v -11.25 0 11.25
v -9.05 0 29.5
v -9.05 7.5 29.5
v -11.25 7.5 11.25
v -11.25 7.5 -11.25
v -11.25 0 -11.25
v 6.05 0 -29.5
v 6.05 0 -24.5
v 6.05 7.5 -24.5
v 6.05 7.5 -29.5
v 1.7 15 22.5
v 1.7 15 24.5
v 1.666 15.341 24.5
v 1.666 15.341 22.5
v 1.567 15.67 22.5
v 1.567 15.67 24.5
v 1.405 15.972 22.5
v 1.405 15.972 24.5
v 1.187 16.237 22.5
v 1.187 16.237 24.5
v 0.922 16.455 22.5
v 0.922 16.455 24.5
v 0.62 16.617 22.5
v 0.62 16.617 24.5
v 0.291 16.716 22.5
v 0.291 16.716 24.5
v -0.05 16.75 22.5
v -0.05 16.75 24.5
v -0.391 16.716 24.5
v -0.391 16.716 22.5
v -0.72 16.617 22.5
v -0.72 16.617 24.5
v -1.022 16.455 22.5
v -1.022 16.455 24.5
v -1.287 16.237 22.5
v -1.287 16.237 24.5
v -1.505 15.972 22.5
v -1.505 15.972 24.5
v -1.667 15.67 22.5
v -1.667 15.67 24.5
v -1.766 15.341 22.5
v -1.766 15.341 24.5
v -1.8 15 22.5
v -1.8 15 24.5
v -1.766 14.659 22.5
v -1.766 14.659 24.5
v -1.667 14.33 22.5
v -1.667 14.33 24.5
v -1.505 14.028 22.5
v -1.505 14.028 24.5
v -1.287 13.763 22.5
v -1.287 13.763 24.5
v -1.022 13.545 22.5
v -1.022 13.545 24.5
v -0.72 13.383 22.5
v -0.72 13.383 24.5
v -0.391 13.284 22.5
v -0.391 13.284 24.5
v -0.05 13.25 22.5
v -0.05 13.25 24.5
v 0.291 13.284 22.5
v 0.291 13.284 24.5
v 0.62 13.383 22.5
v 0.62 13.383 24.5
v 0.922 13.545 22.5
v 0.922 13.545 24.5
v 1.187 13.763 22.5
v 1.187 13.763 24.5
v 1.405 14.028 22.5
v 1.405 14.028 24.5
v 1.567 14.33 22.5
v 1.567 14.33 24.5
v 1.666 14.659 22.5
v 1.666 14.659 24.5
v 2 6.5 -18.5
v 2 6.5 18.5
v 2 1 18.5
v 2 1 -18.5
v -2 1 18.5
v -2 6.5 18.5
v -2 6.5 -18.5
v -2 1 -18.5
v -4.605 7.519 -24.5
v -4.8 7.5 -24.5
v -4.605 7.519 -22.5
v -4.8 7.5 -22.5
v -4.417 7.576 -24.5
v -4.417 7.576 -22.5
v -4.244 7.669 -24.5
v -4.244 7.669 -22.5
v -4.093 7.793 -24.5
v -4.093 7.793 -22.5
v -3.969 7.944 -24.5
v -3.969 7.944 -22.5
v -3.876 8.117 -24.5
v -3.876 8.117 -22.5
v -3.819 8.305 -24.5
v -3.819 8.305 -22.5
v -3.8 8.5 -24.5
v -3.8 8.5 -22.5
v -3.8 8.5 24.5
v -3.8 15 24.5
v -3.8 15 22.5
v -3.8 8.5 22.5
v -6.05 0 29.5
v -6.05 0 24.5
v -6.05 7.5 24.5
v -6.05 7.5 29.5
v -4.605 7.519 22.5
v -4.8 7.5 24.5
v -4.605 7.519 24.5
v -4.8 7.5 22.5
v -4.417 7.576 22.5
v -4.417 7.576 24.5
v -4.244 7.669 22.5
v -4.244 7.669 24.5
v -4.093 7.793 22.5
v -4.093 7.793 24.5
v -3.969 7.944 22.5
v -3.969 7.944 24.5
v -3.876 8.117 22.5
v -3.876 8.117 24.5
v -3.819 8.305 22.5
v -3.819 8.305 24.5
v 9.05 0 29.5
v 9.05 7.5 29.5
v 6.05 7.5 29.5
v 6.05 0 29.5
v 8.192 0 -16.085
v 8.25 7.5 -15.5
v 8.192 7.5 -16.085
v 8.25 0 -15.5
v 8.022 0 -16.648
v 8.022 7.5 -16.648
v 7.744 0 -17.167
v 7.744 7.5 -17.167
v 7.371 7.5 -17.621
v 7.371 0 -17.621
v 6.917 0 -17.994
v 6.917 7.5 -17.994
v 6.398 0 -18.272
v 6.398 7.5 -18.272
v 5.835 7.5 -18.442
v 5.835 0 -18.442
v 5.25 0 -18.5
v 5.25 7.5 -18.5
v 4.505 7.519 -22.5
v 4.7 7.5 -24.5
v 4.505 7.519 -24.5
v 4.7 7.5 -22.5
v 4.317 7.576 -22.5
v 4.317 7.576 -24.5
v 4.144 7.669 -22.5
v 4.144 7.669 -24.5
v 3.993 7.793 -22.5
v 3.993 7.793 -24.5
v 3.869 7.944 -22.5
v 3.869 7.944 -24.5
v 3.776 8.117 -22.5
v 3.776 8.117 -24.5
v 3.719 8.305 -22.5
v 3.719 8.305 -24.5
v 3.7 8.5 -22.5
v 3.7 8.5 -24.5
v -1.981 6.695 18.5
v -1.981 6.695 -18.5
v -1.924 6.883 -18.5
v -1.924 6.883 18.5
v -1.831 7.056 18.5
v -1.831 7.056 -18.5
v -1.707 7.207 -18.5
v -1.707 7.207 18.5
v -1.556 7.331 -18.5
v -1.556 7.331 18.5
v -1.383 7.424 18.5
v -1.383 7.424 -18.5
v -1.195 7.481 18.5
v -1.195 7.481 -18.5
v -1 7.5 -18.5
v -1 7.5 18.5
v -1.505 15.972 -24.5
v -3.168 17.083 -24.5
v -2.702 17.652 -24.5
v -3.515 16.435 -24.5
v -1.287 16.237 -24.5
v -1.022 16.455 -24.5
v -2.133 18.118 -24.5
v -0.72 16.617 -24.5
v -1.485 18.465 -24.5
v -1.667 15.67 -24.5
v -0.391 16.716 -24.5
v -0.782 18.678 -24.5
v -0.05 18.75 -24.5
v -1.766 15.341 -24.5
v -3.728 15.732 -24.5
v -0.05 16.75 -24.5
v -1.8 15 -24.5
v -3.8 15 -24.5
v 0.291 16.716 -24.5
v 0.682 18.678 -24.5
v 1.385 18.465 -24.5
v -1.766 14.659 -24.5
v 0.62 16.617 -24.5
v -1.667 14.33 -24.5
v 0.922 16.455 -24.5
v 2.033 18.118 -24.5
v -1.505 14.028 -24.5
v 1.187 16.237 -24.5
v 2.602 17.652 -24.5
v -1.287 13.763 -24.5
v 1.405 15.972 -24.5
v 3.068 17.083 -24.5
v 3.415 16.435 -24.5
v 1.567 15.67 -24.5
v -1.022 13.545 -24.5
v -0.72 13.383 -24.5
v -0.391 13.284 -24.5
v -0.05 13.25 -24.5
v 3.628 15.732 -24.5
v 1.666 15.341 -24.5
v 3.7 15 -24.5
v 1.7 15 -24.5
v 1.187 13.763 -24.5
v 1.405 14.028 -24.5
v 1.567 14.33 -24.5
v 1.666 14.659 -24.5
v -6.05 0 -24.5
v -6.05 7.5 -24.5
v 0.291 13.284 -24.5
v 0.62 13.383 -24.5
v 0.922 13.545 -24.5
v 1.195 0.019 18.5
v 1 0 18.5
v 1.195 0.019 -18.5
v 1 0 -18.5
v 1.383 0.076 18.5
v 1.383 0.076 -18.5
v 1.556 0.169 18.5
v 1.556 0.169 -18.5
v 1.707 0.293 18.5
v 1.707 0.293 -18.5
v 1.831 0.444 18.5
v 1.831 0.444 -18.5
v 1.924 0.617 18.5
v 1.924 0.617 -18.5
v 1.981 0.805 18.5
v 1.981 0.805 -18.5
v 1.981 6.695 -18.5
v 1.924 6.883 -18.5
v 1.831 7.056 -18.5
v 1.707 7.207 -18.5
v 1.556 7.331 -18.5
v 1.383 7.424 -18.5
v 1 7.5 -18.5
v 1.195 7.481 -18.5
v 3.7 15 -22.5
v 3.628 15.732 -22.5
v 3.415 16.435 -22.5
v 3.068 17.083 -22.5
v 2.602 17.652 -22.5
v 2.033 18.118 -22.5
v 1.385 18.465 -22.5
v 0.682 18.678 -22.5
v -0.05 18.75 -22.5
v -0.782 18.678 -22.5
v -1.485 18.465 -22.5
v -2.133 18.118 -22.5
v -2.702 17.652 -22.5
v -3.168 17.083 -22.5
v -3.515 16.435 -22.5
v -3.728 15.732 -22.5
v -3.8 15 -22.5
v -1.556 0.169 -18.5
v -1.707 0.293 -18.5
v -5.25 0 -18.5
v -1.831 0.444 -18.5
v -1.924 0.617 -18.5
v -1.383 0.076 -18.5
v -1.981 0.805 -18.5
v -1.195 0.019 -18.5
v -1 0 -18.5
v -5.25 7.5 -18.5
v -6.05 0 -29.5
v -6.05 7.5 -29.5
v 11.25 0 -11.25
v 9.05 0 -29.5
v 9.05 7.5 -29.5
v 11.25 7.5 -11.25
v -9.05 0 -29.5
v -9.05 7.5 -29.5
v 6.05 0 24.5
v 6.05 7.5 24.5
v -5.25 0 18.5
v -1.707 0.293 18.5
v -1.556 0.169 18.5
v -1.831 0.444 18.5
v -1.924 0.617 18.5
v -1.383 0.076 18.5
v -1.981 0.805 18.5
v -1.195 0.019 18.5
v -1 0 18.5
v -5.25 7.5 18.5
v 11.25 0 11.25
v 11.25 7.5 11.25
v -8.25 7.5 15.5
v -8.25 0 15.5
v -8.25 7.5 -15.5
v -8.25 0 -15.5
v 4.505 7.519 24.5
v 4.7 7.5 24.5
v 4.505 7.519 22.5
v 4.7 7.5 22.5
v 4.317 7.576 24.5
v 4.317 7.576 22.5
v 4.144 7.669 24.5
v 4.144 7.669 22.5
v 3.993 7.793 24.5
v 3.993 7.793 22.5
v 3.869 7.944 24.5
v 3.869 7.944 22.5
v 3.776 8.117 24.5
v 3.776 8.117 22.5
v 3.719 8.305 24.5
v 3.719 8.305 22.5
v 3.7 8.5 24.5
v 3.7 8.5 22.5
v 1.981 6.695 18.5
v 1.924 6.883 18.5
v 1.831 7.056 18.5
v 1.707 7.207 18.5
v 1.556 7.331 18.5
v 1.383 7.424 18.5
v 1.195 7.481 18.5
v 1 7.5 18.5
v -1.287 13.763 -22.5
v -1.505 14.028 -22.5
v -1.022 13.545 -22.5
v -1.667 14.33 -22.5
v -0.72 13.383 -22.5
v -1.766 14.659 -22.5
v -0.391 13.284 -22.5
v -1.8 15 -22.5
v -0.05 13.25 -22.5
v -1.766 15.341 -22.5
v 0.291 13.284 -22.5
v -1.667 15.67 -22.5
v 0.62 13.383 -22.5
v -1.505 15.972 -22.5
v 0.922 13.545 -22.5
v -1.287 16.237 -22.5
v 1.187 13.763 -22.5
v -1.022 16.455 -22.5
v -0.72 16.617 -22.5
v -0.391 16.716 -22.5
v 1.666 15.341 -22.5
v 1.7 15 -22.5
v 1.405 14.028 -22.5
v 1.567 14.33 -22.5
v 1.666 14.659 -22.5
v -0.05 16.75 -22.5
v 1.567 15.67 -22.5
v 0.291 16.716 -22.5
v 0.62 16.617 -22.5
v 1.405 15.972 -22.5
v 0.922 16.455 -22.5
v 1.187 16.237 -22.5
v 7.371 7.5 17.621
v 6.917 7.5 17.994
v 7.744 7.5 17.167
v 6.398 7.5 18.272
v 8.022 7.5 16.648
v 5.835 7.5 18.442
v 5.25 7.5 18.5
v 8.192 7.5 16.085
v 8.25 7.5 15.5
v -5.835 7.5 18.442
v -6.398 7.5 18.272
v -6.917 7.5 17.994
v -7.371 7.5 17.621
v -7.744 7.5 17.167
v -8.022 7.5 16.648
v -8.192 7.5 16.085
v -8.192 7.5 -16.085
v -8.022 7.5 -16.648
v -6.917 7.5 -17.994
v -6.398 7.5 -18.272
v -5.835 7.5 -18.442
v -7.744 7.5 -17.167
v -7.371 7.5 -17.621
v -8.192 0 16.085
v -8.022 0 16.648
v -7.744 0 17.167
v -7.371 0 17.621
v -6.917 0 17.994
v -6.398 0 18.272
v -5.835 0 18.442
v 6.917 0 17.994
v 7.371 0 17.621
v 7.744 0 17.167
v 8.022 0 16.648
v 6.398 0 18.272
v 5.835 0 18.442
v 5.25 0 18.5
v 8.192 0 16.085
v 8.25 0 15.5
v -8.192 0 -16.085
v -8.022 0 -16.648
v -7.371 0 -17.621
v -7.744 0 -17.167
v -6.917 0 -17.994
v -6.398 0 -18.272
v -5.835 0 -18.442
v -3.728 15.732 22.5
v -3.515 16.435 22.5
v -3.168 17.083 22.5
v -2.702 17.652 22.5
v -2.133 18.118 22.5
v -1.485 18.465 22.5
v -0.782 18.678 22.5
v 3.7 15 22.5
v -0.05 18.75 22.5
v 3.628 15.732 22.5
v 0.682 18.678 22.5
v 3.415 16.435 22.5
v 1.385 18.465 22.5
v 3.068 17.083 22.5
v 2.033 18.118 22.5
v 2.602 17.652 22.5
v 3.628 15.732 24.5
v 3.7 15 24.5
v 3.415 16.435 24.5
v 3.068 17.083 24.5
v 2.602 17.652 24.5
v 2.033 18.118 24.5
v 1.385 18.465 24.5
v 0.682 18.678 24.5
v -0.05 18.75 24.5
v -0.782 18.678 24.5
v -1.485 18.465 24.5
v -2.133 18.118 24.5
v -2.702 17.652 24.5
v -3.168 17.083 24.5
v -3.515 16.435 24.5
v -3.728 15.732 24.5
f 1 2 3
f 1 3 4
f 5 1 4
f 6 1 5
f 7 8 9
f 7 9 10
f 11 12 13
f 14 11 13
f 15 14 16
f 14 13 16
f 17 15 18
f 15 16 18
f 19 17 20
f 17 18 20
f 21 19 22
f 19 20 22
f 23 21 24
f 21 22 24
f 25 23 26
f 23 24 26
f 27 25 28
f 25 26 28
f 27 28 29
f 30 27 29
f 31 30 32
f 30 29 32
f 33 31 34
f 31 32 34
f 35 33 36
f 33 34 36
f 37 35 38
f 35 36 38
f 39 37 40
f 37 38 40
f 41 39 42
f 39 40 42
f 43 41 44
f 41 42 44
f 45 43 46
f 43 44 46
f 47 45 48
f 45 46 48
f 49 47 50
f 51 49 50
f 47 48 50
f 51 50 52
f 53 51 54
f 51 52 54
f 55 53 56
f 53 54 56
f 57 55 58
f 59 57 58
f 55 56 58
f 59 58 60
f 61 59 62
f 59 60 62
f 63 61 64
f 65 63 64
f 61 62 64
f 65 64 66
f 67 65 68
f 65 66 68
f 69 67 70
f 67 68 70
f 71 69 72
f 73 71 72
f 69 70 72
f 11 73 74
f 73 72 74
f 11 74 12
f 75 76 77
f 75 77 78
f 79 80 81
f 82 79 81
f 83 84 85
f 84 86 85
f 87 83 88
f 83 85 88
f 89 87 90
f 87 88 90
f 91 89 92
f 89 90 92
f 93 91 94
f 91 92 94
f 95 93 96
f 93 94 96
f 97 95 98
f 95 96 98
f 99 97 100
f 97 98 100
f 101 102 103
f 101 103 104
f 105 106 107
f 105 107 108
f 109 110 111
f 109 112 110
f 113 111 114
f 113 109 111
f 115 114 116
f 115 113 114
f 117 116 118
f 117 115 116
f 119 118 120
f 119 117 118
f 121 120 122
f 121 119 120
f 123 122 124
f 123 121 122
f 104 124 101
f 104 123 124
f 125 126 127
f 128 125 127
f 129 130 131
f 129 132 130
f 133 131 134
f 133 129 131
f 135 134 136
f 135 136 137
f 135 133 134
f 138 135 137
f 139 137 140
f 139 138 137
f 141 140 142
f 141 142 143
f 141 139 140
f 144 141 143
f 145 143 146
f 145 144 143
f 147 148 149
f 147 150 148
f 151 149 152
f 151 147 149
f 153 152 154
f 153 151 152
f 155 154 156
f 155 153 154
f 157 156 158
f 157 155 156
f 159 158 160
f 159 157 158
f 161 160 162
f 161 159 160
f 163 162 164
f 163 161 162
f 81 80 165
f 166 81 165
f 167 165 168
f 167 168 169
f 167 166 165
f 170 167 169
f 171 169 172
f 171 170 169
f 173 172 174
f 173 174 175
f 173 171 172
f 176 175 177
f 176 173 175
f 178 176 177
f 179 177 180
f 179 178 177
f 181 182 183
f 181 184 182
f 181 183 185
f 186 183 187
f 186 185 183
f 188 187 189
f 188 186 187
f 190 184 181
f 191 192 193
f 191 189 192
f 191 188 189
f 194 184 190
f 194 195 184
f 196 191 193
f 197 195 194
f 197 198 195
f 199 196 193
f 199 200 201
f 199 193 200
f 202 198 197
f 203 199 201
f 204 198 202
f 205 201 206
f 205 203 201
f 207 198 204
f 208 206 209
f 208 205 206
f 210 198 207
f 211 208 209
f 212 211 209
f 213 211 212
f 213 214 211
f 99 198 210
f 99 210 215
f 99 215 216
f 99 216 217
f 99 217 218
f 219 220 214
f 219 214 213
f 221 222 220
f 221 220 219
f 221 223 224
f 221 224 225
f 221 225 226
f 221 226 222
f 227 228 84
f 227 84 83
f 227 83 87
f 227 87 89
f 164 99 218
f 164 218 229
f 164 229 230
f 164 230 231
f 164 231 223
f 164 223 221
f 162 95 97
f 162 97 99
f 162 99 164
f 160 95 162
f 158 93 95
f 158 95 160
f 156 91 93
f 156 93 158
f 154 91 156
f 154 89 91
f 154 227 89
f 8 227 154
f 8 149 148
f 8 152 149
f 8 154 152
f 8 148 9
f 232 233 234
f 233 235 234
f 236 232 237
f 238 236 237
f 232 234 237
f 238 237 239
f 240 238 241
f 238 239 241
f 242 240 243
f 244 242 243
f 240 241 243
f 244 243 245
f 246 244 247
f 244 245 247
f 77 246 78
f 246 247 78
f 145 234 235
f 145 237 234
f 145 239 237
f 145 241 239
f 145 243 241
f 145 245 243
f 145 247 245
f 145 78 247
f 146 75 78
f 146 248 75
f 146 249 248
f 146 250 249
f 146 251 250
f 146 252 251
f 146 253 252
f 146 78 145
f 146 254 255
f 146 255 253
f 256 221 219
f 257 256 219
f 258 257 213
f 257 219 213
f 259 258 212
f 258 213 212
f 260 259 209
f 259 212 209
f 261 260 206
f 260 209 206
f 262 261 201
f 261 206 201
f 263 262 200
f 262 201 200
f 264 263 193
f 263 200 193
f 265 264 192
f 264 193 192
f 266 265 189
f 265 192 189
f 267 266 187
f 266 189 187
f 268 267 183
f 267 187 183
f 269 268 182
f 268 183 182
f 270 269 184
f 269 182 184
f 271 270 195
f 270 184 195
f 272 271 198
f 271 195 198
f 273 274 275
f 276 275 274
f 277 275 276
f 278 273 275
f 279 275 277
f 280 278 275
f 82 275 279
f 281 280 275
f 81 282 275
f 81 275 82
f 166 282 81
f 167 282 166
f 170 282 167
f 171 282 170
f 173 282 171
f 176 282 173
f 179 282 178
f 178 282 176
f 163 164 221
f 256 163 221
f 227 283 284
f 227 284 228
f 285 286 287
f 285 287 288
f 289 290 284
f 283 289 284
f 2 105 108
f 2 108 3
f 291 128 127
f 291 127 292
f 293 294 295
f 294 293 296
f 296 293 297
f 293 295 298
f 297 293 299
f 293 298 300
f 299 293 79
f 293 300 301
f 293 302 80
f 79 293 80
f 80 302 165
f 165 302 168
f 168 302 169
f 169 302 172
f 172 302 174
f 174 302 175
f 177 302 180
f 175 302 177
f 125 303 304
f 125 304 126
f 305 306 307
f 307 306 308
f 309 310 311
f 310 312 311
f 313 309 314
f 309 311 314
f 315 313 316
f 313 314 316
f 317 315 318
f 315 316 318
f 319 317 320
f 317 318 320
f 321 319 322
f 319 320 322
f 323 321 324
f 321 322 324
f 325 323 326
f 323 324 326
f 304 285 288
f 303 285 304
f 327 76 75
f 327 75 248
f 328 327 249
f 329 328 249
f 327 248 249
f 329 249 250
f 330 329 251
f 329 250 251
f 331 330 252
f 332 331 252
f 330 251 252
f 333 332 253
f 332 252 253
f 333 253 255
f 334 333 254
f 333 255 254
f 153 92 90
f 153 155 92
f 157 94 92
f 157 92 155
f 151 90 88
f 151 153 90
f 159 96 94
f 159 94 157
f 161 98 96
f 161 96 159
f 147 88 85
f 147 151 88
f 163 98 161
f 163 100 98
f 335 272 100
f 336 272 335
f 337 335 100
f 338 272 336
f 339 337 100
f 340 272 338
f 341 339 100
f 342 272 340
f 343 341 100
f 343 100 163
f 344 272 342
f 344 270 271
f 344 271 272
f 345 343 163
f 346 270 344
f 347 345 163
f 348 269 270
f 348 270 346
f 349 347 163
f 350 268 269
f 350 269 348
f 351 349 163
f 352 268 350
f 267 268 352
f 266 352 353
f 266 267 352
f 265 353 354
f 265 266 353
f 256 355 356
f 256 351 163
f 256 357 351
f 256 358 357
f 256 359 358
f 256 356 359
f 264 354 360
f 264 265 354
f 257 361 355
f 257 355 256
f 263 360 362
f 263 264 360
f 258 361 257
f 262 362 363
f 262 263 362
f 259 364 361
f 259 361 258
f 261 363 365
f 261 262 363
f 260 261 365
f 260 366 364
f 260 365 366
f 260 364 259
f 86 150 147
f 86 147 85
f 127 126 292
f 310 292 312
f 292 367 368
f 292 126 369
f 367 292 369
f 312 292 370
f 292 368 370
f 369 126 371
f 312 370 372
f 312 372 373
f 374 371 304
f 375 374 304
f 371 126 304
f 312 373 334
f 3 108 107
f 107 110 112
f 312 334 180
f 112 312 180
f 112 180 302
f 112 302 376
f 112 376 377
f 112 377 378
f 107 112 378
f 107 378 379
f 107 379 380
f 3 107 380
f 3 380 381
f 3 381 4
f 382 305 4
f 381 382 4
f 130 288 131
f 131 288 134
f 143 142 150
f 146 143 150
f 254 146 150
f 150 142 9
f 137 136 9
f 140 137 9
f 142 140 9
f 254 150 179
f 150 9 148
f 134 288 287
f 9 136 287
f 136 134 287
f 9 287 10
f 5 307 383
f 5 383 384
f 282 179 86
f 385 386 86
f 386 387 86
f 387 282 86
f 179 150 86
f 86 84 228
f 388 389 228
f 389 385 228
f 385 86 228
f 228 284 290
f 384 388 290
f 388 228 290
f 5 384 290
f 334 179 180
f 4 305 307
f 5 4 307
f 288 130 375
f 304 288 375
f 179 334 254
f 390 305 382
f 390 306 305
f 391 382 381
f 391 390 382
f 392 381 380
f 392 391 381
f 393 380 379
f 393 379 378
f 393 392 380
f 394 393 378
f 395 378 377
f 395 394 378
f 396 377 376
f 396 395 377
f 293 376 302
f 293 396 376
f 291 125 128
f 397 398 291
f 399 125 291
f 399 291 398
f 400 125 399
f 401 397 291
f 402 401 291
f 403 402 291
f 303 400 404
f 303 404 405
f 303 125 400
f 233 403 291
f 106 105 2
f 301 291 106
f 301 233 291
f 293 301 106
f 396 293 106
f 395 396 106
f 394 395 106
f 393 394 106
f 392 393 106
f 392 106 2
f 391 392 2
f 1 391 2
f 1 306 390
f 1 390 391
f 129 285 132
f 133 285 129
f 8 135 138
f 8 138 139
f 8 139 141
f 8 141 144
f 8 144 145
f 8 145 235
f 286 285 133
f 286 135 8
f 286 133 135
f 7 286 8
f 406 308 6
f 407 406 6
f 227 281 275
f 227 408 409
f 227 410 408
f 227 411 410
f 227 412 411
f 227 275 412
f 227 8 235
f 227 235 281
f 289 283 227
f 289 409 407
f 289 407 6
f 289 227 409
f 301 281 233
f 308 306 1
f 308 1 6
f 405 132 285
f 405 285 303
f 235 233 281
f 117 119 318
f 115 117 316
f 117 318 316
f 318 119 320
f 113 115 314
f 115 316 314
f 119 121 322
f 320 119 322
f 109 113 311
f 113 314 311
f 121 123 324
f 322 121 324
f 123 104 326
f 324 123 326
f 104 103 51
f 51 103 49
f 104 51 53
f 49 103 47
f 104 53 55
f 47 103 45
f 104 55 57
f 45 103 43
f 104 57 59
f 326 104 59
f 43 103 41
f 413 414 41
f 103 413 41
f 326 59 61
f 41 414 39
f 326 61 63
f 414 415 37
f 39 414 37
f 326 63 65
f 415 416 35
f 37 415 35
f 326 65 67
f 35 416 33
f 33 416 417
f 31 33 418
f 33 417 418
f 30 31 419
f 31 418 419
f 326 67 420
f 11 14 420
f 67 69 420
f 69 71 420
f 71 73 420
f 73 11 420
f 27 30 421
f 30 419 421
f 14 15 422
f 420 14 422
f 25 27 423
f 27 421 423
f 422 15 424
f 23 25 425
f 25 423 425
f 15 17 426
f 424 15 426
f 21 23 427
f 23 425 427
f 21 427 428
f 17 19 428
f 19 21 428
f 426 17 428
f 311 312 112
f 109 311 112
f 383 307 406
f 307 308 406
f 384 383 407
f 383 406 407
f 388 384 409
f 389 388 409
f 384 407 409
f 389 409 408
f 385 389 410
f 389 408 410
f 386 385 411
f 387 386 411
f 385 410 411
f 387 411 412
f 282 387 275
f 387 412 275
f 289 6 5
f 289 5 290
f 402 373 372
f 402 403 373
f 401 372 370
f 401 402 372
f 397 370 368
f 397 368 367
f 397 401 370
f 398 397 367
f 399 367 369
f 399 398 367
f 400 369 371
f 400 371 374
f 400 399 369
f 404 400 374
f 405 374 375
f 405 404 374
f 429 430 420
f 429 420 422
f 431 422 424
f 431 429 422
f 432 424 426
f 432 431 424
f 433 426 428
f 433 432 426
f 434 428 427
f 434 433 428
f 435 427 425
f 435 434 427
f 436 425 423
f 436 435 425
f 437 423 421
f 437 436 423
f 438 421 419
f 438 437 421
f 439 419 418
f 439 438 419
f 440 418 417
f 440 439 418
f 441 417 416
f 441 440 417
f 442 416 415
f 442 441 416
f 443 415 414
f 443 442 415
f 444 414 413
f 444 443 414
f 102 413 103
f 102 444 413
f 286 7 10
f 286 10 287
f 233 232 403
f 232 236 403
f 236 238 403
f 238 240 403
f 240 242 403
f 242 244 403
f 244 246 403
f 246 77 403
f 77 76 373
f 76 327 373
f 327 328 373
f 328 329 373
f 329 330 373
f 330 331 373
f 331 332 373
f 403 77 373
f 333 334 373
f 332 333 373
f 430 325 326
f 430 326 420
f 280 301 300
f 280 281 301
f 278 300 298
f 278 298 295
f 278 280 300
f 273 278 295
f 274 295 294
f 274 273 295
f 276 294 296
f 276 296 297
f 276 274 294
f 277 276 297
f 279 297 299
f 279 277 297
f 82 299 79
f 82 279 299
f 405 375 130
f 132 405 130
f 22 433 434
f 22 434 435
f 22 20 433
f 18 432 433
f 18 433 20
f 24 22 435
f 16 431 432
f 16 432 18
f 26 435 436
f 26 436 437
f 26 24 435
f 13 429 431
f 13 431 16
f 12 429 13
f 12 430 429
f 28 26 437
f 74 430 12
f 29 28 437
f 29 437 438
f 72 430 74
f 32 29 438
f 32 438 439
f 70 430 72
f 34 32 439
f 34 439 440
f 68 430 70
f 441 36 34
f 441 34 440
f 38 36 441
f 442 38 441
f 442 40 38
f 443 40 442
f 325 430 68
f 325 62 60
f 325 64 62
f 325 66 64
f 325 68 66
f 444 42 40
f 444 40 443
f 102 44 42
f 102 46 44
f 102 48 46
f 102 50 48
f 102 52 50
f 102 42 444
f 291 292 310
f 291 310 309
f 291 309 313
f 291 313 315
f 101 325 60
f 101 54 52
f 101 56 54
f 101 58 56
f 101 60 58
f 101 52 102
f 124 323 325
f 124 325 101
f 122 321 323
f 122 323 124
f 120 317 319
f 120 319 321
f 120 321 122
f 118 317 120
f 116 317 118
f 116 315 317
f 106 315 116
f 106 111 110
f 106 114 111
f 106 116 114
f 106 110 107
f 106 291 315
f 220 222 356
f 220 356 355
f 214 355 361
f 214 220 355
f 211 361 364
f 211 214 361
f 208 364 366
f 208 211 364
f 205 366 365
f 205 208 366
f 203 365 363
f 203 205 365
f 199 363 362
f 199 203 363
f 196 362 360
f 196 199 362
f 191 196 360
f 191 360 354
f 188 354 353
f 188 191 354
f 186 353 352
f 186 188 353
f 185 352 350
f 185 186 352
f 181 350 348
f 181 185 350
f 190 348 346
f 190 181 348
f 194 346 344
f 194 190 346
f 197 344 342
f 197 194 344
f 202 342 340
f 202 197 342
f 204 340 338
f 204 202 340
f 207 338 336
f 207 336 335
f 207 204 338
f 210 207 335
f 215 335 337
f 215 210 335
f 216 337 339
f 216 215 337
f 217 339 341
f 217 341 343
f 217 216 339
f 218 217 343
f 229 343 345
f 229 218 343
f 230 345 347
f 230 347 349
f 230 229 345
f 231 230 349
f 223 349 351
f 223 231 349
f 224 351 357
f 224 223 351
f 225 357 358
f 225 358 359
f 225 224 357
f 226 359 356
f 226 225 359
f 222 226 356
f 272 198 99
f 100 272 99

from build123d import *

# Parameters (mm, degrees)
SKETCH1_W           = 16.5
SKETCH1_H           = 16.5
BOSS_EXTRUDE2_DEPTH = 7.5
SKETCH2_W           = 16.5
SKETCH2_H           = 10.25
CUT_EXTRUDE1_DEPTH  = 33.450924486
SKETCH5_W           = 4
SKETCH5_H           = 37
BOSS_EXTRUDE4_DEPTH = 7.5
SKETCH4_R           = 1.75
BOSS_EXTRUDE3_DEPTH = 2
FILLET1_R           = 3
FILLET2_R           = 1
FILLET3_R           = 1


with BuildPart() as part:
    # Sketch1 → Boss-Extrude2 (new body)
    with BuildSketch(Plane(origin=(0, 0, 0), x_dir=(1, 0, 0), z_dir=(0, 1, 0))):
        Polygon((-11.25, -11.25), (-11.25, 11.25), (-9.05, 29.5), (-6.05, 29.5), (-6.05, 24.5), (6.05, 24.5), (6.05, 29.5), (9.05, 29.5), (11.25, 11.25), (11.25, -11.25), (9.05, -29.5), (6.05, -29.5), (6.05, -24.5), (-6.05, -24.5), (-6.05, -29.5), (-9.05, -29.5), align=None)
        Rectangle(SKETCH1_W, SKETCH1_H, mode=Mode.SUBTRACT)
    extrude(amount=BOSS_EXTRUDE2_DEPTH)

    # Sketch2 → Cut-Extrude1 (cut, through all)
    with BuildSketch(Plane(origin=(0, 7.5, 0), x_dir=(1, 0, 0), z_dir=(0, 1, 0))):
        with Locations((0, 13.375)):
            Rectangle(SKETCH2_W, SKETCH2_H)
        with Locations((0, -13.375)):
            Rectangle(SKETCH2_W, SKETCH2_H)
    extrude(amount=-CUT_EXTRUDE1_DEPTH, mode=Mode.SUBTRACT)

    # Sketch5 → Boss-Extrude4 (add)
    with BuildSketch(Plane(origin=(0, 7.5, 0), x_dir=(1, 0, 0), z_dir=(0, 1, 0))):
        Rectangle(SKETCH5_W, SKETCH5_H)
    extrude(amount=-BOSS_EXTRUDE4_DEPTH)

    # Sketch4 → Boss-Extrude3 (add)
    with BuildSketch(Plane.XY.offset(24.5)):
        with BuildLine():
            Line((-3.8, 7.5), (3.7, 7.5))
            Line((3.7, 7.5), (3.7, 15))
            ThreePointArc((3.7, 15), (-0.05, 18.75), (-3.8, 15))
            Line((-3.8, 15), (-3.8, 7.5))
        make_face()
        with Locations((-0.05, 15)):
            Circle(SKETCH4_R, mode=Mode.SUBTRACT)
    boss_extrude3 = extrude(amount=-BOSS_EXTRUDE3_DEPTH)

    # Mirror1: Boss-Extrude3 across plane
    add(boss_extrude3.mirror(Plane.XY))

    # Fillet1
    fillet1_edges = [part.edges().sort_by_distance(p)[0] for p in [
        (-8.25, 3.75, -18.5),
        (8.25, 3.75, -18.5),
        (8.25, 3.75, 18.5),
        (-8.25, 3.75, 18.5),
    ]]
    fillet(fillet1_edges, radius=FILLET1_R)

    # Fillet2
    fillet2_edges = [part.edges().sort_by_distance(p)[0] for p in [
        (-3.8, 7.5, 23.5),
        (3.7, 7.5, 23.5),
        (-3.8, 7.5, -23.5),
        (3.7, 7.5, -23.5),
    ]]
    fillet(fillet2_edges, radius=FILLET2_R)

    # Fillet3
    fillet3_edges = [part.edges().sort_by_distance(p)[0] for p in [
        (-2, 7.5, 0),
        (2, 7.5, 0),
        (-2, 0, 0),
        (2, 0, 0),
    ]]
    fillet(fillet3_edges, radius=FILLET3_R)


solid = part.part
